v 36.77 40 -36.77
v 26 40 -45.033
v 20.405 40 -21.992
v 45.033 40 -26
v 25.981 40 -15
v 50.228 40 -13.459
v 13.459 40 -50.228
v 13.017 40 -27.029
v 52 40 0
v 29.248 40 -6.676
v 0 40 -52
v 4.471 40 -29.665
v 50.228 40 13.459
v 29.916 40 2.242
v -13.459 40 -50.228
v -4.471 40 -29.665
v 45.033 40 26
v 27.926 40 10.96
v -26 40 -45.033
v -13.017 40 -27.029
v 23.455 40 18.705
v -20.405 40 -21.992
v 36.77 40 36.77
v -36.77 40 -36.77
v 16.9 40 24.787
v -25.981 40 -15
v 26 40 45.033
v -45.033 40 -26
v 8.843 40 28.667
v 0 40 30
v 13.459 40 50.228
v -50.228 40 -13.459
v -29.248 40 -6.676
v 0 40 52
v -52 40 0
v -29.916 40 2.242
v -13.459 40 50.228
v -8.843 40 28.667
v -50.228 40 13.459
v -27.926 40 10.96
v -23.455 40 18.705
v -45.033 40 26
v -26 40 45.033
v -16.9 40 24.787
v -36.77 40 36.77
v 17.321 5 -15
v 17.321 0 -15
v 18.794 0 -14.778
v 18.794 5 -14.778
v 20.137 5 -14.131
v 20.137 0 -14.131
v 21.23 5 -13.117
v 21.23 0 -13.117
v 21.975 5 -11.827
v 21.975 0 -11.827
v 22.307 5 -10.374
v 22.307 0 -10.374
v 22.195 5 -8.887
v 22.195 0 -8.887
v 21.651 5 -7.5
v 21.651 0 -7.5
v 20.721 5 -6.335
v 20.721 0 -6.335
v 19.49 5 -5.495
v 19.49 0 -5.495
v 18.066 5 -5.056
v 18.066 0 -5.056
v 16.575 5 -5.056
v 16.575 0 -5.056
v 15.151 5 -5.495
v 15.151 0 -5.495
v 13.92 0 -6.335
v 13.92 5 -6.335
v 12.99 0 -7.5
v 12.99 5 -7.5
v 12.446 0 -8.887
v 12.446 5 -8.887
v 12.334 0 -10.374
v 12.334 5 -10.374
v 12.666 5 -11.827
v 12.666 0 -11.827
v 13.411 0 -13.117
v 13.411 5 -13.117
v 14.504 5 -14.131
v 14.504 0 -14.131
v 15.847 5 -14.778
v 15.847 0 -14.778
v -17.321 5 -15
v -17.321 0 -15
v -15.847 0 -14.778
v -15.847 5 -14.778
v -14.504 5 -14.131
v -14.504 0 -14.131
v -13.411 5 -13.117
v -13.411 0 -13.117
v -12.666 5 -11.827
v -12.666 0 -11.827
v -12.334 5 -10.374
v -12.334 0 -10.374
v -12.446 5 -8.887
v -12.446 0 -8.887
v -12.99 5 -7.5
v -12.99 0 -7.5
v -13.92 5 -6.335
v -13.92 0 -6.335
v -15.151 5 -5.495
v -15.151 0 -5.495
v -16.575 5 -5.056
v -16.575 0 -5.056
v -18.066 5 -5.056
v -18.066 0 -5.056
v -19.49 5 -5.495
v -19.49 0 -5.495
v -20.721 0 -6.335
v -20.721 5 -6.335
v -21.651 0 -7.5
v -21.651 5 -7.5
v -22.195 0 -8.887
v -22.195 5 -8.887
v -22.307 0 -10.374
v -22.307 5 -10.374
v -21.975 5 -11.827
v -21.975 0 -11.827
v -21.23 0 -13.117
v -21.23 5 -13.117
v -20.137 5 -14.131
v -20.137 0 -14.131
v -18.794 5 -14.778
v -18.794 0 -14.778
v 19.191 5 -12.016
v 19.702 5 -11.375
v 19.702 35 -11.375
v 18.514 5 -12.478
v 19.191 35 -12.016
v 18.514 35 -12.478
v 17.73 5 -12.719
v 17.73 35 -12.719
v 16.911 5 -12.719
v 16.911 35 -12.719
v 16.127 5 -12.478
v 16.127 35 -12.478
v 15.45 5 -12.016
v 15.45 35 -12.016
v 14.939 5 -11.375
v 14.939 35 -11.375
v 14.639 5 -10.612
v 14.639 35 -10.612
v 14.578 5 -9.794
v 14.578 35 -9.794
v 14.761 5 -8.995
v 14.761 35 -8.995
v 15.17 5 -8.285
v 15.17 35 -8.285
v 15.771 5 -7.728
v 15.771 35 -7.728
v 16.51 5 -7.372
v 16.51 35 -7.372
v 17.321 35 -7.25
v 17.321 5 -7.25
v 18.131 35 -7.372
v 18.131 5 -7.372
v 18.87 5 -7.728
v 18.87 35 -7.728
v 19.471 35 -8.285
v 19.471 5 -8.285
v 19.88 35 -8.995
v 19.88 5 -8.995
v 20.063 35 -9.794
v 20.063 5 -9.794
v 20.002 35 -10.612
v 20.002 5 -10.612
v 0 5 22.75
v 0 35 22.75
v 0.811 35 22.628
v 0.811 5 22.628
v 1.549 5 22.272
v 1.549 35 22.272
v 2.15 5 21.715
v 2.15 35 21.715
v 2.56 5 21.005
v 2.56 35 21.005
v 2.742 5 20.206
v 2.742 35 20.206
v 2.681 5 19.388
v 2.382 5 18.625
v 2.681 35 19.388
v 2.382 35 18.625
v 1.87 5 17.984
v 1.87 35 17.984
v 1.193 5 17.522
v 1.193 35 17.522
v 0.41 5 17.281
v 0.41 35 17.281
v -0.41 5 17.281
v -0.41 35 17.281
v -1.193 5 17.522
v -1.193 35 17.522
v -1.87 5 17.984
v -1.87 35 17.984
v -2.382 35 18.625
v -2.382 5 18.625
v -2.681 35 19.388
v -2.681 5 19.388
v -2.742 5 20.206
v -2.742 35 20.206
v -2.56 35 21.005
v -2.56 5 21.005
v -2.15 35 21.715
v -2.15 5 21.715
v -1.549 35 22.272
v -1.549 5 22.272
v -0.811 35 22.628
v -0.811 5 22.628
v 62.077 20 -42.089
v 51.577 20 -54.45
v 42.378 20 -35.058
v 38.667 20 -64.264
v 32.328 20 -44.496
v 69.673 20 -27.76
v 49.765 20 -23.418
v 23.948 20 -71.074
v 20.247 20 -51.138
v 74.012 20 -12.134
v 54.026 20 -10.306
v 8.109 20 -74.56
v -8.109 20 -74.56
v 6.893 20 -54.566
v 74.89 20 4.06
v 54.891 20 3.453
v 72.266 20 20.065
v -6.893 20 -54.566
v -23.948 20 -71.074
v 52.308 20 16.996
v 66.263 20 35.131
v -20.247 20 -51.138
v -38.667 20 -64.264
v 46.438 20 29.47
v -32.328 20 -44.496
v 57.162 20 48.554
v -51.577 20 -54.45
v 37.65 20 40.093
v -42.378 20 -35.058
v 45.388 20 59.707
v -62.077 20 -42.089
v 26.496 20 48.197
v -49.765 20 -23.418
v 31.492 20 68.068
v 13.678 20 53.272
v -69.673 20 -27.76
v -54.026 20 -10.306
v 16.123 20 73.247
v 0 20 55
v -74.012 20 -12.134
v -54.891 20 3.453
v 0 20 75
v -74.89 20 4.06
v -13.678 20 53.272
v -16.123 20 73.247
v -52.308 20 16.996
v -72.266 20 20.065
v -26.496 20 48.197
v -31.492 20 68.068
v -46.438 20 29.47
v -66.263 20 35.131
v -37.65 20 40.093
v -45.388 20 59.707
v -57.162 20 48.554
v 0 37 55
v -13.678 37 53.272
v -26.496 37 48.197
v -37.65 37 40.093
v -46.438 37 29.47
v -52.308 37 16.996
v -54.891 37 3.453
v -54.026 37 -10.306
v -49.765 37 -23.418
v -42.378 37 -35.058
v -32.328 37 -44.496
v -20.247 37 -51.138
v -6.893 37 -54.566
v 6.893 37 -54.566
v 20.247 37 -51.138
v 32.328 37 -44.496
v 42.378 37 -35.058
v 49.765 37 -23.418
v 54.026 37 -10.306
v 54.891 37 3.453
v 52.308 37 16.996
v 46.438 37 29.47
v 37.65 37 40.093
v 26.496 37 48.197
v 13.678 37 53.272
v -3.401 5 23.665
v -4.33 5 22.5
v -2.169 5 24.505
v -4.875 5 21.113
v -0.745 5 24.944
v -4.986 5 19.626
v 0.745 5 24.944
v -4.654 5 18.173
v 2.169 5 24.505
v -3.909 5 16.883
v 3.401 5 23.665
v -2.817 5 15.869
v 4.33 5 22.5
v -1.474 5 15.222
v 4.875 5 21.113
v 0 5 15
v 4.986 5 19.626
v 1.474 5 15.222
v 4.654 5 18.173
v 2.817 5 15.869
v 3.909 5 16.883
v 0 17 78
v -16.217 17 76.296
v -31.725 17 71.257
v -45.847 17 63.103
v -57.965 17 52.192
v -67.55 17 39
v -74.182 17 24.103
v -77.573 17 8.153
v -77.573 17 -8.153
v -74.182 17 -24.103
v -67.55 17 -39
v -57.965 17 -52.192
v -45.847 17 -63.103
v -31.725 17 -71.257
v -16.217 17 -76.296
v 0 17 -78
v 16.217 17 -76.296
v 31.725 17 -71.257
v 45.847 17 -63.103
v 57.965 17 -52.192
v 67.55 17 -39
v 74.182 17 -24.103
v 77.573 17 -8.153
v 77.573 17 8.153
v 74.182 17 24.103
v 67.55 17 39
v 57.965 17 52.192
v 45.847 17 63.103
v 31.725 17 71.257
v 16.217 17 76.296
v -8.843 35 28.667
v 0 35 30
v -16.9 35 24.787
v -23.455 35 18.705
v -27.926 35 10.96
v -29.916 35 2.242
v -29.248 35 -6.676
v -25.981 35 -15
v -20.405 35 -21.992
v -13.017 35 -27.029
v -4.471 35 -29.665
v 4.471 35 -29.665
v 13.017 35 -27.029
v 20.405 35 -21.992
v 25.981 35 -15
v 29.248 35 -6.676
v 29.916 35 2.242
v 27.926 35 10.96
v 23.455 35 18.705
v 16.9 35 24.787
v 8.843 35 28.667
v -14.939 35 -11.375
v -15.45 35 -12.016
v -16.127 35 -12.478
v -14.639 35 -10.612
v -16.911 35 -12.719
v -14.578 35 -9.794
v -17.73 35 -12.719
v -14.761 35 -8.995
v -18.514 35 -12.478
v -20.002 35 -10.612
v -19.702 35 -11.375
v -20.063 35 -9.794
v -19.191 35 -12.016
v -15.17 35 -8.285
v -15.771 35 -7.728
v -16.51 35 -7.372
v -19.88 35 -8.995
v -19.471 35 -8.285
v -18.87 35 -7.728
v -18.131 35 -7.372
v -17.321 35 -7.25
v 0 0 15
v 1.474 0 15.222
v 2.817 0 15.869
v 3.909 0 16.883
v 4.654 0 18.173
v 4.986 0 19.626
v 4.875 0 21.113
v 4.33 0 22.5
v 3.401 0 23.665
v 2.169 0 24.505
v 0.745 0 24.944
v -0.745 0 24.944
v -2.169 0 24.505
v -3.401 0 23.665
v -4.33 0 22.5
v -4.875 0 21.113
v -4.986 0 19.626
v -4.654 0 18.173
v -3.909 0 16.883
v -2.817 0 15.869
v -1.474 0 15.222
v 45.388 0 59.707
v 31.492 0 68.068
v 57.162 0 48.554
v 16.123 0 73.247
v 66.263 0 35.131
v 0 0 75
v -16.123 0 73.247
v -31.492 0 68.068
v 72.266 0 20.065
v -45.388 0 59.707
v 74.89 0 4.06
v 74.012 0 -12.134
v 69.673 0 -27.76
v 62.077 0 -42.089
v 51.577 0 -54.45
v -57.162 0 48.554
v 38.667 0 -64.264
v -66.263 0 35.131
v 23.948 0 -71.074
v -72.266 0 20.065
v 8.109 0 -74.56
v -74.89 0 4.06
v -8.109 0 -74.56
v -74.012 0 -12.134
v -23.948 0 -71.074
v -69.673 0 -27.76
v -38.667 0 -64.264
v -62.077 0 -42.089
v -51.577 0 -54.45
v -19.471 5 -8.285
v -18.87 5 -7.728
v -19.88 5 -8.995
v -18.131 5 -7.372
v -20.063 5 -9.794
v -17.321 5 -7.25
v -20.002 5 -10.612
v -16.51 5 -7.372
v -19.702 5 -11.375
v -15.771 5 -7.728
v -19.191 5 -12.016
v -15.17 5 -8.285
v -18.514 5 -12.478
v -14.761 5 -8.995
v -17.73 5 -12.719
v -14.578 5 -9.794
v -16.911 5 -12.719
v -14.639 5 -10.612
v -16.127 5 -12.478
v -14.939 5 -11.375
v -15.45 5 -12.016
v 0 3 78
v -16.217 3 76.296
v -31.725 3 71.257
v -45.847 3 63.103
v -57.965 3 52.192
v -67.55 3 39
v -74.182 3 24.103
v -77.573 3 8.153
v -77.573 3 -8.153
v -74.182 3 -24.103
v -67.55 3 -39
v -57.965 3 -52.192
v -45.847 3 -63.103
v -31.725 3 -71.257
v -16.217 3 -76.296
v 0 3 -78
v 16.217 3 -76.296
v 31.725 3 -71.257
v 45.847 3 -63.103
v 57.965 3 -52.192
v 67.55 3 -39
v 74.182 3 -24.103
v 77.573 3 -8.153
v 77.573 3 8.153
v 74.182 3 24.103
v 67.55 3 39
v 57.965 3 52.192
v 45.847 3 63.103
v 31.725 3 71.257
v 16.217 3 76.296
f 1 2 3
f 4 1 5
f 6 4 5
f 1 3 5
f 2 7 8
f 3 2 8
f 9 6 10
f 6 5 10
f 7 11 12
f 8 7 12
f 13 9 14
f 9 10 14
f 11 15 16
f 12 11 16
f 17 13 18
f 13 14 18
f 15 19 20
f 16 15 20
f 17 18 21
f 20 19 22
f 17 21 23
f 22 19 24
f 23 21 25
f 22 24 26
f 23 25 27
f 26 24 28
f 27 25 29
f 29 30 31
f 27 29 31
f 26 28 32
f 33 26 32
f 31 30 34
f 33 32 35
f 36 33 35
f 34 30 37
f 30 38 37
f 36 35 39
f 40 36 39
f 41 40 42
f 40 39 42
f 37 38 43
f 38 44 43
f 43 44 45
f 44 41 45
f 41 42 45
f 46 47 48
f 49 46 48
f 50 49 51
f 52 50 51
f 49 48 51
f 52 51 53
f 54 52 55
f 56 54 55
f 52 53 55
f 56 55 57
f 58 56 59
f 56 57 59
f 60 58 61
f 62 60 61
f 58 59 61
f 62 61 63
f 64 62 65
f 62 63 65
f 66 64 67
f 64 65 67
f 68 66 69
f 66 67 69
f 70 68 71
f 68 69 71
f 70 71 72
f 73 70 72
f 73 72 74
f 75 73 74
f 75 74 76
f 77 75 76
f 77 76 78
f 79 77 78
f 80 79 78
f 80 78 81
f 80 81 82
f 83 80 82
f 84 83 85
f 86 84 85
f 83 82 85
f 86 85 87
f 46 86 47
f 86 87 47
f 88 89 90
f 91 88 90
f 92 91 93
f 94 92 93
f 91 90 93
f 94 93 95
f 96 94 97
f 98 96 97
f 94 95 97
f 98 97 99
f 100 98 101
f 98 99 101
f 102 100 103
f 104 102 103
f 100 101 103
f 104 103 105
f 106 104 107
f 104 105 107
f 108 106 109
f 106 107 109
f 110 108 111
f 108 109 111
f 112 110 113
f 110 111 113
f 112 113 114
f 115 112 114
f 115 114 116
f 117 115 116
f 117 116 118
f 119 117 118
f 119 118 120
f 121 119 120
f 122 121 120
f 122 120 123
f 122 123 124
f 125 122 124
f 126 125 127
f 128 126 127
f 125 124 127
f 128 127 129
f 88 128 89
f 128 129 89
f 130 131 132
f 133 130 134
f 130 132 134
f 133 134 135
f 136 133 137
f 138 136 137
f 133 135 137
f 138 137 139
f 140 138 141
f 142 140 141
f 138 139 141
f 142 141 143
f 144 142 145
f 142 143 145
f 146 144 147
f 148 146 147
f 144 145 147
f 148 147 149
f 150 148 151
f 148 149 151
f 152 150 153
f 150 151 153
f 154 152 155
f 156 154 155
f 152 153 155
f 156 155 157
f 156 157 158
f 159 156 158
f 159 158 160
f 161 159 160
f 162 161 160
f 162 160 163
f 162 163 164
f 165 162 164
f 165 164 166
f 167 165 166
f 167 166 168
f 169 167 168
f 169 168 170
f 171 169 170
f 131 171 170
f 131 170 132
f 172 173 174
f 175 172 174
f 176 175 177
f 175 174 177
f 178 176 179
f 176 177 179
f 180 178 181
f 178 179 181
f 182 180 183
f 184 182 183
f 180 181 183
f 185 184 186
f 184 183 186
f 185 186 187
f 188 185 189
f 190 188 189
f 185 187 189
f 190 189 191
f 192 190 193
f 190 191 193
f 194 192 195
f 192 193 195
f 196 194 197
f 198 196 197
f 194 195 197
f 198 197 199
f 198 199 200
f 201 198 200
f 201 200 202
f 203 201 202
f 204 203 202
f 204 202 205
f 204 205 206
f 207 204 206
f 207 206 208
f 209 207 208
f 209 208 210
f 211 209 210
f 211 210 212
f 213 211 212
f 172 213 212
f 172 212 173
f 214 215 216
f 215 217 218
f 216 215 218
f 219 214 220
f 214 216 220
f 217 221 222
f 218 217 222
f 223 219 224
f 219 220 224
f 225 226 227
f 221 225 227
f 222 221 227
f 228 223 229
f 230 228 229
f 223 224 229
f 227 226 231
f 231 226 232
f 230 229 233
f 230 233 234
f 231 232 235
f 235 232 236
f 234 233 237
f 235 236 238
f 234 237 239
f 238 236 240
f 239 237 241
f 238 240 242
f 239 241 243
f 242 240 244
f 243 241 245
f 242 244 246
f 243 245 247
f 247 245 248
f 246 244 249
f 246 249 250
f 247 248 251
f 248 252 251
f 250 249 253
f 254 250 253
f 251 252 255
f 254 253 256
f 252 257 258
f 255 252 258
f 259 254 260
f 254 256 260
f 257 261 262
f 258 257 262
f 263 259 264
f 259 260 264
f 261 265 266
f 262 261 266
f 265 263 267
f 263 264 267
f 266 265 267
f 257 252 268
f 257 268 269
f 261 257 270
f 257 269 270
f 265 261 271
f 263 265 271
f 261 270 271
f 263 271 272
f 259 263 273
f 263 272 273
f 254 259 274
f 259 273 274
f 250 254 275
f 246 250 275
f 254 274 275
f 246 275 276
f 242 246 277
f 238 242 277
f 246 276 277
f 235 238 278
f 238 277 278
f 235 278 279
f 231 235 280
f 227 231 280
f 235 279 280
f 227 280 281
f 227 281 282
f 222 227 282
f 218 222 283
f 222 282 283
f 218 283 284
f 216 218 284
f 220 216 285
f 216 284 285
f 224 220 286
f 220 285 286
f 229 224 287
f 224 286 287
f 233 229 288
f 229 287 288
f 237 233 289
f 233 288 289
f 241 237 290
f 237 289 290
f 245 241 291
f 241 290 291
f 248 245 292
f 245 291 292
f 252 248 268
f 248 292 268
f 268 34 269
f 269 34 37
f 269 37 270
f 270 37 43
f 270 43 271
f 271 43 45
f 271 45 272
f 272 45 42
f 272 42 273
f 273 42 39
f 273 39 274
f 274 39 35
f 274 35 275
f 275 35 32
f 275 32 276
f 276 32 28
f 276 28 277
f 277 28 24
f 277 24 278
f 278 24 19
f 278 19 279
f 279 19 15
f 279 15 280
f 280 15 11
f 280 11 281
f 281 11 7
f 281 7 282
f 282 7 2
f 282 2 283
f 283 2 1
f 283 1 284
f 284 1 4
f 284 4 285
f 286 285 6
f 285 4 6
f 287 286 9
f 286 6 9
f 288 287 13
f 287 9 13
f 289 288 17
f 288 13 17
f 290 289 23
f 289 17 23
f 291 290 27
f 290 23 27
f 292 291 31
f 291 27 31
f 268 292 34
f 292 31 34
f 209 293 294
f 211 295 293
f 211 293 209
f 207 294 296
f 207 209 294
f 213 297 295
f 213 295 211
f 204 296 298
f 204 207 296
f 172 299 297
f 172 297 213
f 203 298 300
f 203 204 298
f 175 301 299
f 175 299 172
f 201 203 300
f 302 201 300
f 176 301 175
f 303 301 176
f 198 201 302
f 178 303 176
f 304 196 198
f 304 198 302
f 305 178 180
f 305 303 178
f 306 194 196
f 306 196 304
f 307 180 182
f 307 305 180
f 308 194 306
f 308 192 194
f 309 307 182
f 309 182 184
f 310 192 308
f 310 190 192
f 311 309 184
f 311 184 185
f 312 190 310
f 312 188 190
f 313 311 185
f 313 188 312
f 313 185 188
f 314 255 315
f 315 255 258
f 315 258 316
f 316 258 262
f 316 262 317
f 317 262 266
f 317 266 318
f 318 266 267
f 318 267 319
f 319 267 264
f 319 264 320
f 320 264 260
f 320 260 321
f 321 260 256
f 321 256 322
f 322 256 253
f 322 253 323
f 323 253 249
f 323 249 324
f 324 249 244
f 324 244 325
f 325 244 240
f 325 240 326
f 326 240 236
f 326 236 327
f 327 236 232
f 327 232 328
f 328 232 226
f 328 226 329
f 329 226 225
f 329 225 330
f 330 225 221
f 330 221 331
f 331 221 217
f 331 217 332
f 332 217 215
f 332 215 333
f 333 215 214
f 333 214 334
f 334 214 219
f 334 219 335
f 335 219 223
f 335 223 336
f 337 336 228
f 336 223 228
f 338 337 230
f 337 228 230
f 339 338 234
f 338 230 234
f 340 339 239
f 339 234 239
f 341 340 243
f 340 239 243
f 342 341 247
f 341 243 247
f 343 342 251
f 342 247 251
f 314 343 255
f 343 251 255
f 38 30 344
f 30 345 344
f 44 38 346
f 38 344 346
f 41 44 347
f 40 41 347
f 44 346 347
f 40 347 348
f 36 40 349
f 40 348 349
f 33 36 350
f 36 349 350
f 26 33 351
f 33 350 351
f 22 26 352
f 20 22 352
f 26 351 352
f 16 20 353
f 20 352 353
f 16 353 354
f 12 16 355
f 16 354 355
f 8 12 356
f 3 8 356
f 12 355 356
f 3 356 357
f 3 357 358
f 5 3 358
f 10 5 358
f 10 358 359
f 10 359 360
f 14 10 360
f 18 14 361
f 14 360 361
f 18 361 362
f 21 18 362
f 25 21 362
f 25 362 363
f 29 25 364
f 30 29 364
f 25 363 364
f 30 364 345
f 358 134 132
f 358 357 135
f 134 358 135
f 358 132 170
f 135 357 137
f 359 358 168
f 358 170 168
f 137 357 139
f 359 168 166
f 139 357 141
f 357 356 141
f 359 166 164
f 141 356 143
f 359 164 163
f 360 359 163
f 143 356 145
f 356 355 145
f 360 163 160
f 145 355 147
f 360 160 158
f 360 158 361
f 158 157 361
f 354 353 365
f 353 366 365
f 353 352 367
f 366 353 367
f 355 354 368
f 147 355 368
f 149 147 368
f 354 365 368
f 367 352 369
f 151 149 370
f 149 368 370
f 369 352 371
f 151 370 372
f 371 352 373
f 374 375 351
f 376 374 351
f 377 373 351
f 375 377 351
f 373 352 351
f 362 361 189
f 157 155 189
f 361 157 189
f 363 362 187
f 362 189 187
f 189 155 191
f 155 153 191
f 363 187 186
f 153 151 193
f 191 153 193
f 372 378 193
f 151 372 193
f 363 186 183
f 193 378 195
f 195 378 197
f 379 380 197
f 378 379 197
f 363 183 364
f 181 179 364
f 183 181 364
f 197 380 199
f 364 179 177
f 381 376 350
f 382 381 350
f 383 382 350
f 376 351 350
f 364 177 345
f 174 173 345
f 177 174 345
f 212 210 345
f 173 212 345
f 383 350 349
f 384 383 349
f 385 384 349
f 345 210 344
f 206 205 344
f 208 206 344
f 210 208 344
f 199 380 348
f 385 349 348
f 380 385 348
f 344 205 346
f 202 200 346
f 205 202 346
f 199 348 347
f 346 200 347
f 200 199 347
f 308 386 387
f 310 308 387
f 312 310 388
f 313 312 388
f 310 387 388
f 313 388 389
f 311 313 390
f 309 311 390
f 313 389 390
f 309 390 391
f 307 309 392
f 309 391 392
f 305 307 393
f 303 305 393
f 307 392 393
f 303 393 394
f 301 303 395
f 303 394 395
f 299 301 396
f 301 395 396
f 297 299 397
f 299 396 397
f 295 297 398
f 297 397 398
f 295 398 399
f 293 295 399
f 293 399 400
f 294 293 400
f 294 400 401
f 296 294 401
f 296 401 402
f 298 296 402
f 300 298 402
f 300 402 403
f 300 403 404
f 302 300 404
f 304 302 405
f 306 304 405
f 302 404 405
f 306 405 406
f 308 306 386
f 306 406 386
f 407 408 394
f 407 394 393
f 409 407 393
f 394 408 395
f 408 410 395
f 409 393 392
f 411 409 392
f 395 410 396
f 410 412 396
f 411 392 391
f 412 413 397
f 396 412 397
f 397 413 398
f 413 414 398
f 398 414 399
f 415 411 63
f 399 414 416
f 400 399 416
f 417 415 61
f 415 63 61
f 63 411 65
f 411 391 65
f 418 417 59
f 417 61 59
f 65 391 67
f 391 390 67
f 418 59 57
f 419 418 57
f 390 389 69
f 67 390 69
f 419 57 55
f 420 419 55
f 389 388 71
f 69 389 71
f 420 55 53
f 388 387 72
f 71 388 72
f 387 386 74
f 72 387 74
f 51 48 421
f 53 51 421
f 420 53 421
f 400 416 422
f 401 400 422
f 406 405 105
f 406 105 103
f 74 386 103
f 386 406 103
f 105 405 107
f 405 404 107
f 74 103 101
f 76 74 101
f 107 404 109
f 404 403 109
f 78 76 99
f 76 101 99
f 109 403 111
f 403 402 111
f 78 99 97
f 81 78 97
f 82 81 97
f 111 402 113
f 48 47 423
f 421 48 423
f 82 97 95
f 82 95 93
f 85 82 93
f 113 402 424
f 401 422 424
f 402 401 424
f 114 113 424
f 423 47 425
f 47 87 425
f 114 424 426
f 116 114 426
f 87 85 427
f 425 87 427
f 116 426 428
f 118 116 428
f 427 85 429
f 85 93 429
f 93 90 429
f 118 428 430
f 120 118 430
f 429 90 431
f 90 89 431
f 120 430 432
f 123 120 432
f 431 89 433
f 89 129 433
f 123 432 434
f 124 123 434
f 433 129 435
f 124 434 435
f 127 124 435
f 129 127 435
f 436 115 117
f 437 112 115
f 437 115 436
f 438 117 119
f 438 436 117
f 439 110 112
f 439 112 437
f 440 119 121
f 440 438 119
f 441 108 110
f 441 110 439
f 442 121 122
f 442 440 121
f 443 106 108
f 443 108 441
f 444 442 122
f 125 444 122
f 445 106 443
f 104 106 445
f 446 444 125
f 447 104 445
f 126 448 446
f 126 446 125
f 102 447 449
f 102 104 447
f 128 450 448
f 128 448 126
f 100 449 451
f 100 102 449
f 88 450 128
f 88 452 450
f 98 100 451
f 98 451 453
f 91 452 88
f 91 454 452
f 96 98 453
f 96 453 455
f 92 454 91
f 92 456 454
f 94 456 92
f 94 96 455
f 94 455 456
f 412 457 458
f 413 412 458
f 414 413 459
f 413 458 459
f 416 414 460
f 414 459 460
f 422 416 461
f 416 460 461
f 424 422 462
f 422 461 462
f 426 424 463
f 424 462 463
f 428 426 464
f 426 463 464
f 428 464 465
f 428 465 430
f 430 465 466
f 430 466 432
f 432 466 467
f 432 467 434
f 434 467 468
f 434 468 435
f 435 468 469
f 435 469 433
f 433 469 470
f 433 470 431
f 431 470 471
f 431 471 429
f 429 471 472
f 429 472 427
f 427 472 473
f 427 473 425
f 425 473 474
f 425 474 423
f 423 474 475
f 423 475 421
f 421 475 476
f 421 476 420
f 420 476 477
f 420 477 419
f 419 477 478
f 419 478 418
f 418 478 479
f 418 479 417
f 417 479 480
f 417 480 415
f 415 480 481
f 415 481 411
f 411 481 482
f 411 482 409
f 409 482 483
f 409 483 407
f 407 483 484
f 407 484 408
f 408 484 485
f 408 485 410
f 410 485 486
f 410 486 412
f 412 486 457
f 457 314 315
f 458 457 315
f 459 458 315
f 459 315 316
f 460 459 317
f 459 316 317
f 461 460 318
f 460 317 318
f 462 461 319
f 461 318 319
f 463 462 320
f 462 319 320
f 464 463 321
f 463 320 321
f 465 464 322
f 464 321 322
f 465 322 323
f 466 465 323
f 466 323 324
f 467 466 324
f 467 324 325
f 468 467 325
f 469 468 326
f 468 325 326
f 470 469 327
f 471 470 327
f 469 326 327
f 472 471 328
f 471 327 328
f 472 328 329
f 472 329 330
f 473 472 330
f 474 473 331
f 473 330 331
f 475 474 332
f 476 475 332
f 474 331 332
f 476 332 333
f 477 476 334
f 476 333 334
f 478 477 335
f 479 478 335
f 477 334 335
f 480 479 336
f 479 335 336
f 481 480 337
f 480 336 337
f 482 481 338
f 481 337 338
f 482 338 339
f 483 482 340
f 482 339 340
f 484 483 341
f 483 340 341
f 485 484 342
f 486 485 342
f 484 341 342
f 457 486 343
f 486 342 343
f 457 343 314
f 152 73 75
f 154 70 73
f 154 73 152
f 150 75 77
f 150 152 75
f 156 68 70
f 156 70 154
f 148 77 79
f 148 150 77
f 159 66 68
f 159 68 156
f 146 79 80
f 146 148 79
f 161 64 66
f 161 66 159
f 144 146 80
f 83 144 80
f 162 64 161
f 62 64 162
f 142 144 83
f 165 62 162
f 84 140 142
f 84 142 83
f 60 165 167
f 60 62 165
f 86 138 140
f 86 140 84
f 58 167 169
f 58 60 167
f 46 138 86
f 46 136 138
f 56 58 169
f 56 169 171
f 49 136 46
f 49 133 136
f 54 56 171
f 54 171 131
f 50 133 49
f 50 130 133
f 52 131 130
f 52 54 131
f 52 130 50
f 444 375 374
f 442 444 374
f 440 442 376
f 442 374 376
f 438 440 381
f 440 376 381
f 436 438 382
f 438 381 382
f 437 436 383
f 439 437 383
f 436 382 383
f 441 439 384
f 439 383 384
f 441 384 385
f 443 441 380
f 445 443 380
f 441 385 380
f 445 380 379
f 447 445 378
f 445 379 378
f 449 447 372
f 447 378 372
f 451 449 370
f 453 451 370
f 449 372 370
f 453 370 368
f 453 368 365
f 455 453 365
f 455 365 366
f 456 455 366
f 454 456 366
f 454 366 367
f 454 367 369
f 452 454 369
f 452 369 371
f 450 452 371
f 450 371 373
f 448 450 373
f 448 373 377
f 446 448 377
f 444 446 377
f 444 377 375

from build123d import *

# Parameters (mm, degrees)
M6X0_5_TAPPED_HOLE1_D = 5.5
CIRPATTERN1_COUNT     = 3
CHAMFER1_SIZE         = 3
SKETCH7_R             = 5
CUT_EXTRUDE1_DEPTH    = 5


with BuildPart() as part:
    # Sketch1 → Revolve1 (revolve)
    with BuildSketch(Plane(origin=(0, 0, 0), x_dir=(0, 0, -1), z_dir=(1, 0, 0))):
        Polygon((0, 0), (-78, 0), (-78, 20), (-55, 20), (-55, 40), (-30, 40), (-30, 35), (0, 35), align=None)
    revolve(axis=Axis((0, 226.154402008, 0), (0, -1, 0)))

    # M6x0.5 Tapped Hole1 (through all)
    with Locations(Plane(origin=(0, 0, 20), x_dir=(0, 0, -1), z_dir=(0, -1, 0))):
        with Locations((0, 0)):
            m6x0_5_tapped_hole1 = Hole(M6X0_5_TAPPED_HOLE1_D / 2)

    # CirPattern1: M6x0.5 Tapped Hole1 ×3 about axis
    cirpattern1_axis = Axis((0, 0, 0), (0, 1, 0))
    for i in range(1, CIRPATTERN1_COUNT):
        add(m6x0_5_tapped_hole1.rotate(cirpattern1_axis, i * 360 / CIRPATTERN1_COUNT), mode=Mode.SUBTRACT)

    # Chamfer1
    chamfer1_edges = [part.edges().sort_by_distance(p)[0] for p in [
        (0, 40, -55),
        (0, 20, -78),
        (0, 0, -78),
    ]]
    chamfer(chamfer1_edges, length=CHAMFER1_SIZE)

    # Sketch7 → Cut-Extrude1 (cut)
    with BuildSketch(Plane.XZ):
        with Locations(Location((0, 20, 0), (0, 0, 270))):
            Circle(SKETCH7_R)
        with Locations(Location((17.320508076, -10, 0), (0, 0, 270))):
            Circle(SKETCH7_R)
        with Locations(Location((-17.320508076, -10, 0), (0, 0, 270))):
            Circle(SKETCH7_R)
    extrude(amount=-CUT_EXTRUDE1_DEPTH, mode=Mode.SUBTRACT)


solid = part.part
